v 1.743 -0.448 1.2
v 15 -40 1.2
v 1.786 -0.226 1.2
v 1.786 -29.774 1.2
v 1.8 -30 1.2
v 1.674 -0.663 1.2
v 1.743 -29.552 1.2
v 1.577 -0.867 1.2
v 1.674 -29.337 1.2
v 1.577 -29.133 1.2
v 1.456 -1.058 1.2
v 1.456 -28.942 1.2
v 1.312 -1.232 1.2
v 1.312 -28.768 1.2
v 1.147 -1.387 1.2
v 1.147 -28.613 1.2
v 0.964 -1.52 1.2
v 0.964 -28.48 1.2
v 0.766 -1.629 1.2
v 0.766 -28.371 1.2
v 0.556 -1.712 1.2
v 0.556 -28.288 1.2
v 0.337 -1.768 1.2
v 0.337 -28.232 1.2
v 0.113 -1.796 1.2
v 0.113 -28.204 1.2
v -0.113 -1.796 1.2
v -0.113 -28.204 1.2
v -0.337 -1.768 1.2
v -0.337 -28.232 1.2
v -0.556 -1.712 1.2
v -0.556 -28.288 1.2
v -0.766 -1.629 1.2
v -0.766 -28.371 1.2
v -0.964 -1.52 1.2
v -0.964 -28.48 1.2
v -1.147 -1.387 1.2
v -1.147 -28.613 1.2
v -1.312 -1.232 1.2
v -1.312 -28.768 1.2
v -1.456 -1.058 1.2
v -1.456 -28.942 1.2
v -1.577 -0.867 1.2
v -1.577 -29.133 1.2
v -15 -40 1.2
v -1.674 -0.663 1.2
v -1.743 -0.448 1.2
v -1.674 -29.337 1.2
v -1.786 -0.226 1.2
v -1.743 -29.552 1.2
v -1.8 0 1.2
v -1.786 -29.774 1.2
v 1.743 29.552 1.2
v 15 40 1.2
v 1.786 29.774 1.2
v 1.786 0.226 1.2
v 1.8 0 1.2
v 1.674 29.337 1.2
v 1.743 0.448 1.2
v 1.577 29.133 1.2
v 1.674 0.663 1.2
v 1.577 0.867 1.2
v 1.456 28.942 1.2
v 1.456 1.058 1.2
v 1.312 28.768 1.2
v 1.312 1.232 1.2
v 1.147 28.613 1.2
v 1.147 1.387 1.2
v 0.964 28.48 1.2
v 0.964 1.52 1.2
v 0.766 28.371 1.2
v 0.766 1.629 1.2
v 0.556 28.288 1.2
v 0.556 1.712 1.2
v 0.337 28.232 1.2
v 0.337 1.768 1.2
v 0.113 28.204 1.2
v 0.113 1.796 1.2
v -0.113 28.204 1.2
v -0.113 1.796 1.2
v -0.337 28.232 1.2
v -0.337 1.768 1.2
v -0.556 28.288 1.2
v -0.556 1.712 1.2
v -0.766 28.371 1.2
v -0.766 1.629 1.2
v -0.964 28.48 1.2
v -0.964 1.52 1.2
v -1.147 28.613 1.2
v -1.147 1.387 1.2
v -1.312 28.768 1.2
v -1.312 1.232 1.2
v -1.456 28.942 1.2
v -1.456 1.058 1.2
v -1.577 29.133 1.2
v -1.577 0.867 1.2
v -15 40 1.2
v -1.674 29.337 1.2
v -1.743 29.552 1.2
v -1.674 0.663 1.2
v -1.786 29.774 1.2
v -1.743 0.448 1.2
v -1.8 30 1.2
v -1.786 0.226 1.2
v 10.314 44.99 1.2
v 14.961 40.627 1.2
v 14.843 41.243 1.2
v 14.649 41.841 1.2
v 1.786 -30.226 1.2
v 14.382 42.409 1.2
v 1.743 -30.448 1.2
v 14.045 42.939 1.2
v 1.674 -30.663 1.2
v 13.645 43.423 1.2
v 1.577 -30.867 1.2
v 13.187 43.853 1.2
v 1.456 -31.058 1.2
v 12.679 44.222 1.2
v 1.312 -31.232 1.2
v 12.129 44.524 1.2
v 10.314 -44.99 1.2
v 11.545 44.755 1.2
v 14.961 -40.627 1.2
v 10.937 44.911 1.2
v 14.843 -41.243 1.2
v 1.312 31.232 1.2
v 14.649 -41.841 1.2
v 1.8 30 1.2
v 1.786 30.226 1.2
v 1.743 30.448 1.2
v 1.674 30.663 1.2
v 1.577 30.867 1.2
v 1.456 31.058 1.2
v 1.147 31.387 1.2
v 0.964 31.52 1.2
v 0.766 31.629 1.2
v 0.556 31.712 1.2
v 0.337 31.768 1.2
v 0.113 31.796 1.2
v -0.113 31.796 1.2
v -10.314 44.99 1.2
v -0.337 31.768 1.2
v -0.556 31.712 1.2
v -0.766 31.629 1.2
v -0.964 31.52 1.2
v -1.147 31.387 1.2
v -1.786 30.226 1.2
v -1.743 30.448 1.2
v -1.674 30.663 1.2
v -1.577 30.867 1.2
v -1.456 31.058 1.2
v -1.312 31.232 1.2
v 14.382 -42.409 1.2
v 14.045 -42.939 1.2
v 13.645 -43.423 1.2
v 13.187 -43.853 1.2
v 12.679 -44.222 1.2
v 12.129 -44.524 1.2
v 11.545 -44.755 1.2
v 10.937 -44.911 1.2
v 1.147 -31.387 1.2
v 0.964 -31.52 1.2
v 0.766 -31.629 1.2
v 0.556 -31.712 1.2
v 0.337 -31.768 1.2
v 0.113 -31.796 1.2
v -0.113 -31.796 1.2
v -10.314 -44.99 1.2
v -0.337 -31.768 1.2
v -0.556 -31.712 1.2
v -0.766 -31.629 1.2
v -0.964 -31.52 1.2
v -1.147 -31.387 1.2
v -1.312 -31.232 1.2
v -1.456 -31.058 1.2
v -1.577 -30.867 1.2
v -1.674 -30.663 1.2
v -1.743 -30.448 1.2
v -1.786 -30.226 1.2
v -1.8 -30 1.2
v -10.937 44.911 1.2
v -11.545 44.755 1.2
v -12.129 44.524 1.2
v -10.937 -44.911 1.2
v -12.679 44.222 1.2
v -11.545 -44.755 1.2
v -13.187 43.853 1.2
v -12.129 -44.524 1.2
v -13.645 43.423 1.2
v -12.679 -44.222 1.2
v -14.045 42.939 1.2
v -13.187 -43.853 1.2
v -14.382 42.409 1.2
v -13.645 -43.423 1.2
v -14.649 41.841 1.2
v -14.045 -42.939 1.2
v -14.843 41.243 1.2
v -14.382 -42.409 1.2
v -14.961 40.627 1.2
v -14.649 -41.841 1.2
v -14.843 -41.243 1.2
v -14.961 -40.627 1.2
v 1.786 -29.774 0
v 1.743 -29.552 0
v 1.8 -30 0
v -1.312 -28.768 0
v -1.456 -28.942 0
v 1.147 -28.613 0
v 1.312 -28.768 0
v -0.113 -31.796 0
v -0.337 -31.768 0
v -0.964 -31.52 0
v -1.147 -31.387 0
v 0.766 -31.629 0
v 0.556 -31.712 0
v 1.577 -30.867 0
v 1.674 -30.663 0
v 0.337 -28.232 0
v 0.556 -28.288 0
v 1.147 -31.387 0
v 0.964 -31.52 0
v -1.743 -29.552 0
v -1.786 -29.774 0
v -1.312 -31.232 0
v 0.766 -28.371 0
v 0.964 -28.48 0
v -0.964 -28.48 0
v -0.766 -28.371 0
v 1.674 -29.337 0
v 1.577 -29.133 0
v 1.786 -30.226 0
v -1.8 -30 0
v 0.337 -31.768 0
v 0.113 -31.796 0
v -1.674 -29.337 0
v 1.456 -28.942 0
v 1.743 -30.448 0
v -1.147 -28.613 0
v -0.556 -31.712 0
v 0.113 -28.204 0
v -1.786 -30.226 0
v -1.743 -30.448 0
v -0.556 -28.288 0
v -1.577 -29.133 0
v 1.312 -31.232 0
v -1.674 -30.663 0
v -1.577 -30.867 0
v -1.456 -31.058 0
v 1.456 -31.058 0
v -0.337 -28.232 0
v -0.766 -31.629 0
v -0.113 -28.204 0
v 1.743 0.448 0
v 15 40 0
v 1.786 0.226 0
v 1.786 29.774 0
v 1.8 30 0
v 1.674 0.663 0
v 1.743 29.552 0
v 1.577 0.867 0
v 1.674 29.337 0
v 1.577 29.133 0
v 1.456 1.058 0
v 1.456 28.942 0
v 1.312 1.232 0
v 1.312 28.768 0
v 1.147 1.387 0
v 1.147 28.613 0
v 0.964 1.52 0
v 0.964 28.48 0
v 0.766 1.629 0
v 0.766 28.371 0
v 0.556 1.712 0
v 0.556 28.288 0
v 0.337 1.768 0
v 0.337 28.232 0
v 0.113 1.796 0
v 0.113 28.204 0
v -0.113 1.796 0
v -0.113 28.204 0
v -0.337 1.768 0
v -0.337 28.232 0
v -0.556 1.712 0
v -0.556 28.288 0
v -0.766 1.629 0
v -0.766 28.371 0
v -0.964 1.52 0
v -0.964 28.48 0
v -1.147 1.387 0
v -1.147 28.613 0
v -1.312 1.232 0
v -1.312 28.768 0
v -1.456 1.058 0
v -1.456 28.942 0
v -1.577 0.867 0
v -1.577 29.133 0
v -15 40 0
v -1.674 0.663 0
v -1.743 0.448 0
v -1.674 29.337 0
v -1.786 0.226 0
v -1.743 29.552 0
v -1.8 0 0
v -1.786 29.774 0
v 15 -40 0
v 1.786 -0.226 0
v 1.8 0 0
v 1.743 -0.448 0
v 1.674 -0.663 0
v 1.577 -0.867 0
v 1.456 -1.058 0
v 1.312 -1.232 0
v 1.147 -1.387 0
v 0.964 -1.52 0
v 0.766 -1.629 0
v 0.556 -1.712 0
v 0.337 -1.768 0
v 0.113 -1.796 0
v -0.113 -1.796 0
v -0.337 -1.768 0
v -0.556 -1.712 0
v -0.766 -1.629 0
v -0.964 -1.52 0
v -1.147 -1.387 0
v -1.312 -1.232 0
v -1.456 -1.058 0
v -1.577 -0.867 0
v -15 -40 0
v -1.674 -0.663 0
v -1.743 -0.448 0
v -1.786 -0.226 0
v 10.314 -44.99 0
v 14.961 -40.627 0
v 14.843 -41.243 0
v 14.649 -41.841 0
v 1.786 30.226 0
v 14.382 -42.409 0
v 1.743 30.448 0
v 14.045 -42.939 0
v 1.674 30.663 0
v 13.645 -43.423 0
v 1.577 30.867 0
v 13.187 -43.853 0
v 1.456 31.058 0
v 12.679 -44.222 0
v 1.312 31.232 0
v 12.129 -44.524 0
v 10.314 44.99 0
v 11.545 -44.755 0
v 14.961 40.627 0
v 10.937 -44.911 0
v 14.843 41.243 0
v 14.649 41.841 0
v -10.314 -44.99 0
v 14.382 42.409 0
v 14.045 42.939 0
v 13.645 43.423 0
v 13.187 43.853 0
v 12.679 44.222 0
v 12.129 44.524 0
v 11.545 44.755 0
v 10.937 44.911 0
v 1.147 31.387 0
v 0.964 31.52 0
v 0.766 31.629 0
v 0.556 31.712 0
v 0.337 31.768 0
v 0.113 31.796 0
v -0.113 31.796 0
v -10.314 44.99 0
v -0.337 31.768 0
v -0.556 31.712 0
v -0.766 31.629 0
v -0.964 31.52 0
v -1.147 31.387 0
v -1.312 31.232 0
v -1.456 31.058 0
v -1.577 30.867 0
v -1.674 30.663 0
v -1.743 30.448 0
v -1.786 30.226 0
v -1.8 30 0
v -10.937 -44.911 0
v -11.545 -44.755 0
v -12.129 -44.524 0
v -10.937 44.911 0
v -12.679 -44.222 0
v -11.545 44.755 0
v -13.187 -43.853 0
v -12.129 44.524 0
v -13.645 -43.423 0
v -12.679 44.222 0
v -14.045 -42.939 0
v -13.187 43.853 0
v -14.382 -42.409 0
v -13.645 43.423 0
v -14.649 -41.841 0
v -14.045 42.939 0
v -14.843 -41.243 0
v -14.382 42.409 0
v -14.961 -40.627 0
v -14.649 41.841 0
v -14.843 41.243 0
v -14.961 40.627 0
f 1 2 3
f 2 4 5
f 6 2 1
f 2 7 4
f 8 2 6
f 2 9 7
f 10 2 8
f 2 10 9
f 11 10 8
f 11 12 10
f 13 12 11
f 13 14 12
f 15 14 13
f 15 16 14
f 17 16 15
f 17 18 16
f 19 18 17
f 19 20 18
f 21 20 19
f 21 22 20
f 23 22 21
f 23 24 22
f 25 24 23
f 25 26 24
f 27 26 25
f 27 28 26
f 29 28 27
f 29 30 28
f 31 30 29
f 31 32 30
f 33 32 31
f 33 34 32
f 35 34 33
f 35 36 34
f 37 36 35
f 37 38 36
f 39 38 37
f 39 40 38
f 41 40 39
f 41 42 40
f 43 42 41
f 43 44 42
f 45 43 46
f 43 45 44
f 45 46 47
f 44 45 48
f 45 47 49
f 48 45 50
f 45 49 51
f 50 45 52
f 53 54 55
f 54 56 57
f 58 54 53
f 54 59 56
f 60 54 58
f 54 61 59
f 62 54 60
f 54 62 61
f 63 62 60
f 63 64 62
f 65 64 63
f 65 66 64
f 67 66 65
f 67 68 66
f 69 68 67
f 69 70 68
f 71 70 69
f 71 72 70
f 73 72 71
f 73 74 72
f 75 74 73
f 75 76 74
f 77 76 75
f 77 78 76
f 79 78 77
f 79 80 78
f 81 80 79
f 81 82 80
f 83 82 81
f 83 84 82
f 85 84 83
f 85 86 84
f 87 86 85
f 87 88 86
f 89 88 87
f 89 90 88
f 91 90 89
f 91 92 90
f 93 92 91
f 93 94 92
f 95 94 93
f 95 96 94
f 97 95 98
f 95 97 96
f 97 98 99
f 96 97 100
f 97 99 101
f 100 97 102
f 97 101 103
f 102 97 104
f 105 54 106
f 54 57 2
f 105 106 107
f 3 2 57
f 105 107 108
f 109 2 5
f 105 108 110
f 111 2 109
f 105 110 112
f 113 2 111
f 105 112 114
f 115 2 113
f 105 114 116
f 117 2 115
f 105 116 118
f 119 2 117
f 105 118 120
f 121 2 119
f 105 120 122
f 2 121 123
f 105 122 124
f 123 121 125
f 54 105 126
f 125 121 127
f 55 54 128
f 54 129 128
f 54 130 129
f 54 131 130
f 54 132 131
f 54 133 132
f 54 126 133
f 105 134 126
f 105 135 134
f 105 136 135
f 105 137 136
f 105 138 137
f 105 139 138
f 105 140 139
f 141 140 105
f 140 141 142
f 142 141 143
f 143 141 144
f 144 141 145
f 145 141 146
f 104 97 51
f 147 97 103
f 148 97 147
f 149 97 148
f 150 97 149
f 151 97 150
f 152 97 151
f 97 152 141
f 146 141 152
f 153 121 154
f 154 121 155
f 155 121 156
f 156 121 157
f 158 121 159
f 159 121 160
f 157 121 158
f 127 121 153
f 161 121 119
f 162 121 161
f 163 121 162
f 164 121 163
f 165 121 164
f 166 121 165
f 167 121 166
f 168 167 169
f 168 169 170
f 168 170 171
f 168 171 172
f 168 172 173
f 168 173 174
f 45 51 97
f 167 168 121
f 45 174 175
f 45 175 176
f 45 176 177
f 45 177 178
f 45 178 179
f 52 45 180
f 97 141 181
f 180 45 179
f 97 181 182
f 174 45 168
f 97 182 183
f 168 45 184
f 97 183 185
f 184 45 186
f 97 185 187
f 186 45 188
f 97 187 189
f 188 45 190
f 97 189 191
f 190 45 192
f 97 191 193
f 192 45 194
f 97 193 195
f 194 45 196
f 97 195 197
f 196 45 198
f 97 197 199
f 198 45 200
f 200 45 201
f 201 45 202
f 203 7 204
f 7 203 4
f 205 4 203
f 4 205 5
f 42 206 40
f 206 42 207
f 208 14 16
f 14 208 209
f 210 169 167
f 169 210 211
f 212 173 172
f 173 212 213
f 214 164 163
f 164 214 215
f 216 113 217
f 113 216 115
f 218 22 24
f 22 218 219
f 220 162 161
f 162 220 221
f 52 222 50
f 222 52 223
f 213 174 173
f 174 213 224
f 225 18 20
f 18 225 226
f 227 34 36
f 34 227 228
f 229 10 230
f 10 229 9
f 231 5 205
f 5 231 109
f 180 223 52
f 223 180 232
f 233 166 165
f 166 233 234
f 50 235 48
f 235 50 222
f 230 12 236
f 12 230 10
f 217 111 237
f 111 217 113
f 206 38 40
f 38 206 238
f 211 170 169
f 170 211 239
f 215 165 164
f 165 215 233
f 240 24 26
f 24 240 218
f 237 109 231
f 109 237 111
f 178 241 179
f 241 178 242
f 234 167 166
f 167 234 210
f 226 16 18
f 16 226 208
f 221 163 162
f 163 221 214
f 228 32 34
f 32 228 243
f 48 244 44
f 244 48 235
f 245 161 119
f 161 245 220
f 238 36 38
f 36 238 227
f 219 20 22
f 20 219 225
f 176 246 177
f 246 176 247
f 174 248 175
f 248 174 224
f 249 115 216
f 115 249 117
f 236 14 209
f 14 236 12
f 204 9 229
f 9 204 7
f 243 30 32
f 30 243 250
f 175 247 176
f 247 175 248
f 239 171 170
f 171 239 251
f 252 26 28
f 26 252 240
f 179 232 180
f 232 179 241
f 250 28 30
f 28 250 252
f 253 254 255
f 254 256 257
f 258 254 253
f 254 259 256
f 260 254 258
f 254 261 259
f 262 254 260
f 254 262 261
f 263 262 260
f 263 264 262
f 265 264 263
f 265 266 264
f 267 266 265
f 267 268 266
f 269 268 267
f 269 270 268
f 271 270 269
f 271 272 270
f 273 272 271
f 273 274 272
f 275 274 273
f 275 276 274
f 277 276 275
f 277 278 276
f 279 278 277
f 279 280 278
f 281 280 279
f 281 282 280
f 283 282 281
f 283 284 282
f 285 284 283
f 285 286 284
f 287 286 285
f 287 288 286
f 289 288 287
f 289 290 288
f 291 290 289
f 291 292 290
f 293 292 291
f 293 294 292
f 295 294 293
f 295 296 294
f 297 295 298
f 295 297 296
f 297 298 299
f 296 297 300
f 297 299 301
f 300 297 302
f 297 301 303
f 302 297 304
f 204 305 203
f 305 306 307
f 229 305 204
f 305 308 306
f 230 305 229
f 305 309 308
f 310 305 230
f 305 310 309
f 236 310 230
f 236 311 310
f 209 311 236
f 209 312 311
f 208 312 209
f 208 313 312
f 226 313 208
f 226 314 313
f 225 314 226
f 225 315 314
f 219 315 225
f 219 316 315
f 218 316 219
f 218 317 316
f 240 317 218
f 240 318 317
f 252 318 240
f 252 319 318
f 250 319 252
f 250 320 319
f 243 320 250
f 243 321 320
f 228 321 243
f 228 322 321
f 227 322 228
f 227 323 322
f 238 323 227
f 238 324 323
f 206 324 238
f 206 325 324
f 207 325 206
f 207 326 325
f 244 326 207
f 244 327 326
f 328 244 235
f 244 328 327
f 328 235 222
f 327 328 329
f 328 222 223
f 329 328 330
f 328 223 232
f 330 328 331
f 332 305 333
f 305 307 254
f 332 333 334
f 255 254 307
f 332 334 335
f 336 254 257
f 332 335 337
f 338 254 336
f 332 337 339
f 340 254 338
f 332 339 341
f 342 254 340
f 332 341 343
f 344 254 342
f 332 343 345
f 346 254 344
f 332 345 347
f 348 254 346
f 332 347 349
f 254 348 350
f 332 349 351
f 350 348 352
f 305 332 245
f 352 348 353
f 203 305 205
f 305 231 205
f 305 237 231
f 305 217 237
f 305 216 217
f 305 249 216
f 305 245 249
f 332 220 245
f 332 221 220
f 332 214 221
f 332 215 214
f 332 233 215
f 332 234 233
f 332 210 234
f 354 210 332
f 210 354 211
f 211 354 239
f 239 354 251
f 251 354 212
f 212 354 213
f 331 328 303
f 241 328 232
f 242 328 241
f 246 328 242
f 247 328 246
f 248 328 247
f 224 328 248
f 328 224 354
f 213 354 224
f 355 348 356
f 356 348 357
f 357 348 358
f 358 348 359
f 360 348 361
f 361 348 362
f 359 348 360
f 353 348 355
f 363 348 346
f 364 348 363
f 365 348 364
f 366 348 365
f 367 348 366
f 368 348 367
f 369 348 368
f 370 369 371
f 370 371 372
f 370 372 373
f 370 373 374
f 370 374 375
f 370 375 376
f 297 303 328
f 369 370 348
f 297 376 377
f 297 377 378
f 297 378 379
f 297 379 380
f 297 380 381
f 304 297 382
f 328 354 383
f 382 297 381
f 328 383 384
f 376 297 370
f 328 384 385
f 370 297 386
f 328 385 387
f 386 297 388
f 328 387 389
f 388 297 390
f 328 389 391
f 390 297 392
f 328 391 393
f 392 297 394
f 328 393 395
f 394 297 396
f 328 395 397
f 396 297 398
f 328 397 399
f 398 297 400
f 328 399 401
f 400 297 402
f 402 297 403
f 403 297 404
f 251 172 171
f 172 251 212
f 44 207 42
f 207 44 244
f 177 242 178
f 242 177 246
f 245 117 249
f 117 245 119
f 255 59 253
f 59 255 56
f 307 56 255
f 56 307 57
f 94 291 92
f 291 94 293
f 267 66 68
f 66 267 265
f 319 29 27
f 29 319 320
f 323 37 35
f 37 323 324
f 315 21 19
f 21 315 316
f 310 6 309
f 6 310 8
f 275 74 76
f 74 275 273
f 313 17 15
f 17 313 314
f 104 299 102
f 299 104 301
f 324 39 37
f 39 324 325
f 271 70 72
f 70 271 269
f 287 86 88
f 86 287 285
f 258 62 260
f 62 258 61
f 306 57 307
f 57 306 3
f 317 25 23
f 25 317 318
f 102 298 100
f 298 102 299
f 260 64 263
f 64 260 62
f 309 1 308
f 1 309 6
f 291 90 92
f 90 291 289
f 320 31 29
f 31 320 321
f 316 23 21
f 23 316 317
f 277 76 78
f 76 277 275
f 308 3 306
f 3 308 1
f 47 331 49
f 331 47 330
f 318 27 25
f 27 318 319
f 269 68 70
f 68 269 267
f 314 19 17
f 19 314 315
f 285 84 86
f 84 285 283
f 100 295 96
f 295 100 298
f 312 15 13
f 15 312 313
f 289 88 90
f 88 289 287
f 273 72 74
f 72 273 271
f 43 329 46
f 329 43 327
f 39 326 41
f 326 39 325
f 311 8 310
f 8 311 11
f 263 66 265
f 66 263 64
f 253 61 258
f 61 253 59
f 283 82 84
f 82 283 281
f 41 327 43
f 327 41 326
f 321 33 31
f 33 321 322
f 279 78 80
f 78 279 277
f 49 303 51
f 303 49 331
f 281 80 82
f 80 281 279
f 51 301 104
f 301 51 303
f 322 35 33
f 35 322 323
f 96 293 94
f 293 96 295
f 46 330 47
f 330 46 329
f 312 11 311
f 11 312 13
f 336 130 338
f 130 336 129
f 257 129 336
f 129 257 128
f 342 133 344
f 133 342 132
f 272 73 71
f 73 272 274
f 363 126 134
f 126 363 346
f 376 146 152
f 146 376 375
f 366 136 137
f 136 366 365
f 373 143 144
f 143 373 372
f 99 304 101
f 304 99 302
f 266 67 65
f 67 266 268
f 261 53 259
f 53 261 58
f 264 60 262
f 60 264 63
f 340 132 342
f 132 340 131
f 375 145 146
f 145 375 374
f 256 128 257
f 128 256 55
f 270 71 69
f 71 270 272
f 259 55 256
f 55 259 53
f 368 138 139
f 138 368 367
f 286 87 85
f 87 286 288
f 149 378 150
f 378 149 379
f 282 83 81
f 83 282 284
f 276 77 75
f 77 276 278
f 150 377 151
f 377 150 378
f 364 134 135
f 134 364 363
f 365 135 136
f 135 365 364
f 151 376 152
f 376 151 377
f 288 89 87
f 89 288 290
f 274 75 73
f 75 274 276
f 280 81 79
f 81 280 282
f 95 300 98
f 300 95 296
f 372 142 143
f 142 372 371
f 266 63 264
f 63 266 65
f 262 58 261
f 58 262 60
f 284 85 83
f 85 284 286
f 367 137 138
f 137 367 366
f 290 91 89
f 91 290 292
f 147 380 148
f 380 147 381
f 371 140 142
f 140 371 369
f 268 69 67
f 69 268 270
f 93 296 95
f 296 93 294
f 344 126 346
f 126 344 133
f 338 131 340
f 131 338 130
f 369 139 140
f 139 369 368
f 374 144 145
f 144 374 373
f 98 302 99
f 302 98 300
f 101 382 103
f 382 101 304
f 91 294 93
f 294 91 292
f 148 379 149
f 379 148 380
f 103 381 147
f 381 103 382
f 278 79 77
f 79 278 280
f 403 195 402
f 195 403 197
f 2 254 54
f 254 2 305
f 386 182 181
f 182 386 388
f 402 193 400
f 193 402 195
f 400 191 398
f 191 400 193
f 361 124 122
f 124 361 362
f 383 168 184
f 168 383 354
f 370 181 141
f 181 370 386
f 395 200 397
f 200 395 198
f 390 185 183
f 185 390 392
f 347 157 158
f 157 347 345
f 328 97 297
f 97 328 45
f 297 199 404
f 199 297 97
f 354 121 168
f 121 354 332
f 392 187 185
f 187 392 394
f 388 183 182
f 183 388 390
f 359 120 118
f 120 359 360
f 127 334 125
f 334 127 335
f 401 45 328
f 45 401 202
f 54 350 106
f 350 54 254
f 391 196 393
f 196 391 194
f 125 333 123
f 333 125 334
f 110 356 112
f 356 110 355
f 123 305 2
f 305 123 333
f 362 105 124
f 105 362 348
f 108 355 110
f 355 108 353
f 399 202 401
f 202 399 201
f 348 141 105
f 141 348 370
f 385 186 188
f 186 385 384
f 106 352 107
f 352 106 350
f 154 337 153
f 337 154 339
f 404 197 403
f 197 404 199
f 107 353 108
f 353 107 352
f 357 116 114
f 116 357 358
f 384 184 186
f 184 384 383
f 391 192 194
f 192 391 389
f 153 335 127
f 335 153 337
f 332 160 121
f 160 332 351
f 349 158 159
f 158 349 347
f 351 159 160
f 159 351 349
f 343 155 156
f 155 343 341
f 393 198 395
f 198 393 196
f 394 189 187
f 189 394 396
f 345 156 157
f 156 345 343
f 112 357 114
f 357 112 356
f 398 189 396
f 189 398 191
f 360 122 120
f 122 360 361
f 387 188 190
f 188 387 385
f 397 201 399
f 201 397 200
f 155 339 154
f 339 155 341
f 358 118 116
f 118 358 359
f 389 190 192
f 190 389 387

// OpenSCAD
$fn = 50;


difference() {
	union() {
		hull() {
			translate(v = [-10.0000000000, 40.0000000000, 0]) {
				cylinder(h = 99, r = 5);
			}
			translate(v = [10.0000000000, 40.0000000000, 0]) {
				cylinder(h = 99, r = 5);
			}
			translate(v = [-10.0000000000, -40.0000000000, 0]) {
				cylinder(h = 99, r = 5);
			}
			translate(v = [10.0000000000, -40.0000000000, 0]) {
				cylinder(h = 99, r = 5);
			}
		}
	}
	union() {
		translate(v = [0, 0, 1.2000000000]) {
			hull() {
				translate(v = [-10.0000000000, 40.0000000000, 0]) {
					cylinder(h = 97.8000000000, r = 3.8000000000);
				}
				translate(v = [10.0000000000, 40.0000000000, 0]) {
					cylinder(h = 97.8000000000, r = 3.8000000000);
				}
				translate(v = [-10.0000000000, -40.0000000000, 0]) {
					cylinder(h = 97.8000000000, r = 3.8000000000);
				}
				translate(v = [10.0000000000, -40.0000000000, 0]) {
					cylinder(h = 97.8000000000, r = 3.8000000000);
				}
			}
		}
		#translate(v = [0.0000000000, -30.0000000000, 0]) {
			cylinder(h = 1.2000000000, r = 1.8000000000);
		}
		#cylinder(h = 1.2000000000, r = 1.8000000000);
		#translate(v = [0.0000000000, 30.0000000000, 0]) {
			cylinder(h = 1.2000000000, r = 1.8000000000);
		}
		translate(v = [-250.0000000000, -250.0000000000, 1.2000000000]) {
			cube(size = [500, 500, 500]);
		}
		translate(v = [-250.0000000000, -250.0000000000, 1.2000000000]) {
			cube(size = [500, 500, 500]);
		}
		translate(v = [-250.0000000000, -250.0000000000, 1.2000000000]) {
			cube(size = [500, 500, 500]);
		}
	}
}
